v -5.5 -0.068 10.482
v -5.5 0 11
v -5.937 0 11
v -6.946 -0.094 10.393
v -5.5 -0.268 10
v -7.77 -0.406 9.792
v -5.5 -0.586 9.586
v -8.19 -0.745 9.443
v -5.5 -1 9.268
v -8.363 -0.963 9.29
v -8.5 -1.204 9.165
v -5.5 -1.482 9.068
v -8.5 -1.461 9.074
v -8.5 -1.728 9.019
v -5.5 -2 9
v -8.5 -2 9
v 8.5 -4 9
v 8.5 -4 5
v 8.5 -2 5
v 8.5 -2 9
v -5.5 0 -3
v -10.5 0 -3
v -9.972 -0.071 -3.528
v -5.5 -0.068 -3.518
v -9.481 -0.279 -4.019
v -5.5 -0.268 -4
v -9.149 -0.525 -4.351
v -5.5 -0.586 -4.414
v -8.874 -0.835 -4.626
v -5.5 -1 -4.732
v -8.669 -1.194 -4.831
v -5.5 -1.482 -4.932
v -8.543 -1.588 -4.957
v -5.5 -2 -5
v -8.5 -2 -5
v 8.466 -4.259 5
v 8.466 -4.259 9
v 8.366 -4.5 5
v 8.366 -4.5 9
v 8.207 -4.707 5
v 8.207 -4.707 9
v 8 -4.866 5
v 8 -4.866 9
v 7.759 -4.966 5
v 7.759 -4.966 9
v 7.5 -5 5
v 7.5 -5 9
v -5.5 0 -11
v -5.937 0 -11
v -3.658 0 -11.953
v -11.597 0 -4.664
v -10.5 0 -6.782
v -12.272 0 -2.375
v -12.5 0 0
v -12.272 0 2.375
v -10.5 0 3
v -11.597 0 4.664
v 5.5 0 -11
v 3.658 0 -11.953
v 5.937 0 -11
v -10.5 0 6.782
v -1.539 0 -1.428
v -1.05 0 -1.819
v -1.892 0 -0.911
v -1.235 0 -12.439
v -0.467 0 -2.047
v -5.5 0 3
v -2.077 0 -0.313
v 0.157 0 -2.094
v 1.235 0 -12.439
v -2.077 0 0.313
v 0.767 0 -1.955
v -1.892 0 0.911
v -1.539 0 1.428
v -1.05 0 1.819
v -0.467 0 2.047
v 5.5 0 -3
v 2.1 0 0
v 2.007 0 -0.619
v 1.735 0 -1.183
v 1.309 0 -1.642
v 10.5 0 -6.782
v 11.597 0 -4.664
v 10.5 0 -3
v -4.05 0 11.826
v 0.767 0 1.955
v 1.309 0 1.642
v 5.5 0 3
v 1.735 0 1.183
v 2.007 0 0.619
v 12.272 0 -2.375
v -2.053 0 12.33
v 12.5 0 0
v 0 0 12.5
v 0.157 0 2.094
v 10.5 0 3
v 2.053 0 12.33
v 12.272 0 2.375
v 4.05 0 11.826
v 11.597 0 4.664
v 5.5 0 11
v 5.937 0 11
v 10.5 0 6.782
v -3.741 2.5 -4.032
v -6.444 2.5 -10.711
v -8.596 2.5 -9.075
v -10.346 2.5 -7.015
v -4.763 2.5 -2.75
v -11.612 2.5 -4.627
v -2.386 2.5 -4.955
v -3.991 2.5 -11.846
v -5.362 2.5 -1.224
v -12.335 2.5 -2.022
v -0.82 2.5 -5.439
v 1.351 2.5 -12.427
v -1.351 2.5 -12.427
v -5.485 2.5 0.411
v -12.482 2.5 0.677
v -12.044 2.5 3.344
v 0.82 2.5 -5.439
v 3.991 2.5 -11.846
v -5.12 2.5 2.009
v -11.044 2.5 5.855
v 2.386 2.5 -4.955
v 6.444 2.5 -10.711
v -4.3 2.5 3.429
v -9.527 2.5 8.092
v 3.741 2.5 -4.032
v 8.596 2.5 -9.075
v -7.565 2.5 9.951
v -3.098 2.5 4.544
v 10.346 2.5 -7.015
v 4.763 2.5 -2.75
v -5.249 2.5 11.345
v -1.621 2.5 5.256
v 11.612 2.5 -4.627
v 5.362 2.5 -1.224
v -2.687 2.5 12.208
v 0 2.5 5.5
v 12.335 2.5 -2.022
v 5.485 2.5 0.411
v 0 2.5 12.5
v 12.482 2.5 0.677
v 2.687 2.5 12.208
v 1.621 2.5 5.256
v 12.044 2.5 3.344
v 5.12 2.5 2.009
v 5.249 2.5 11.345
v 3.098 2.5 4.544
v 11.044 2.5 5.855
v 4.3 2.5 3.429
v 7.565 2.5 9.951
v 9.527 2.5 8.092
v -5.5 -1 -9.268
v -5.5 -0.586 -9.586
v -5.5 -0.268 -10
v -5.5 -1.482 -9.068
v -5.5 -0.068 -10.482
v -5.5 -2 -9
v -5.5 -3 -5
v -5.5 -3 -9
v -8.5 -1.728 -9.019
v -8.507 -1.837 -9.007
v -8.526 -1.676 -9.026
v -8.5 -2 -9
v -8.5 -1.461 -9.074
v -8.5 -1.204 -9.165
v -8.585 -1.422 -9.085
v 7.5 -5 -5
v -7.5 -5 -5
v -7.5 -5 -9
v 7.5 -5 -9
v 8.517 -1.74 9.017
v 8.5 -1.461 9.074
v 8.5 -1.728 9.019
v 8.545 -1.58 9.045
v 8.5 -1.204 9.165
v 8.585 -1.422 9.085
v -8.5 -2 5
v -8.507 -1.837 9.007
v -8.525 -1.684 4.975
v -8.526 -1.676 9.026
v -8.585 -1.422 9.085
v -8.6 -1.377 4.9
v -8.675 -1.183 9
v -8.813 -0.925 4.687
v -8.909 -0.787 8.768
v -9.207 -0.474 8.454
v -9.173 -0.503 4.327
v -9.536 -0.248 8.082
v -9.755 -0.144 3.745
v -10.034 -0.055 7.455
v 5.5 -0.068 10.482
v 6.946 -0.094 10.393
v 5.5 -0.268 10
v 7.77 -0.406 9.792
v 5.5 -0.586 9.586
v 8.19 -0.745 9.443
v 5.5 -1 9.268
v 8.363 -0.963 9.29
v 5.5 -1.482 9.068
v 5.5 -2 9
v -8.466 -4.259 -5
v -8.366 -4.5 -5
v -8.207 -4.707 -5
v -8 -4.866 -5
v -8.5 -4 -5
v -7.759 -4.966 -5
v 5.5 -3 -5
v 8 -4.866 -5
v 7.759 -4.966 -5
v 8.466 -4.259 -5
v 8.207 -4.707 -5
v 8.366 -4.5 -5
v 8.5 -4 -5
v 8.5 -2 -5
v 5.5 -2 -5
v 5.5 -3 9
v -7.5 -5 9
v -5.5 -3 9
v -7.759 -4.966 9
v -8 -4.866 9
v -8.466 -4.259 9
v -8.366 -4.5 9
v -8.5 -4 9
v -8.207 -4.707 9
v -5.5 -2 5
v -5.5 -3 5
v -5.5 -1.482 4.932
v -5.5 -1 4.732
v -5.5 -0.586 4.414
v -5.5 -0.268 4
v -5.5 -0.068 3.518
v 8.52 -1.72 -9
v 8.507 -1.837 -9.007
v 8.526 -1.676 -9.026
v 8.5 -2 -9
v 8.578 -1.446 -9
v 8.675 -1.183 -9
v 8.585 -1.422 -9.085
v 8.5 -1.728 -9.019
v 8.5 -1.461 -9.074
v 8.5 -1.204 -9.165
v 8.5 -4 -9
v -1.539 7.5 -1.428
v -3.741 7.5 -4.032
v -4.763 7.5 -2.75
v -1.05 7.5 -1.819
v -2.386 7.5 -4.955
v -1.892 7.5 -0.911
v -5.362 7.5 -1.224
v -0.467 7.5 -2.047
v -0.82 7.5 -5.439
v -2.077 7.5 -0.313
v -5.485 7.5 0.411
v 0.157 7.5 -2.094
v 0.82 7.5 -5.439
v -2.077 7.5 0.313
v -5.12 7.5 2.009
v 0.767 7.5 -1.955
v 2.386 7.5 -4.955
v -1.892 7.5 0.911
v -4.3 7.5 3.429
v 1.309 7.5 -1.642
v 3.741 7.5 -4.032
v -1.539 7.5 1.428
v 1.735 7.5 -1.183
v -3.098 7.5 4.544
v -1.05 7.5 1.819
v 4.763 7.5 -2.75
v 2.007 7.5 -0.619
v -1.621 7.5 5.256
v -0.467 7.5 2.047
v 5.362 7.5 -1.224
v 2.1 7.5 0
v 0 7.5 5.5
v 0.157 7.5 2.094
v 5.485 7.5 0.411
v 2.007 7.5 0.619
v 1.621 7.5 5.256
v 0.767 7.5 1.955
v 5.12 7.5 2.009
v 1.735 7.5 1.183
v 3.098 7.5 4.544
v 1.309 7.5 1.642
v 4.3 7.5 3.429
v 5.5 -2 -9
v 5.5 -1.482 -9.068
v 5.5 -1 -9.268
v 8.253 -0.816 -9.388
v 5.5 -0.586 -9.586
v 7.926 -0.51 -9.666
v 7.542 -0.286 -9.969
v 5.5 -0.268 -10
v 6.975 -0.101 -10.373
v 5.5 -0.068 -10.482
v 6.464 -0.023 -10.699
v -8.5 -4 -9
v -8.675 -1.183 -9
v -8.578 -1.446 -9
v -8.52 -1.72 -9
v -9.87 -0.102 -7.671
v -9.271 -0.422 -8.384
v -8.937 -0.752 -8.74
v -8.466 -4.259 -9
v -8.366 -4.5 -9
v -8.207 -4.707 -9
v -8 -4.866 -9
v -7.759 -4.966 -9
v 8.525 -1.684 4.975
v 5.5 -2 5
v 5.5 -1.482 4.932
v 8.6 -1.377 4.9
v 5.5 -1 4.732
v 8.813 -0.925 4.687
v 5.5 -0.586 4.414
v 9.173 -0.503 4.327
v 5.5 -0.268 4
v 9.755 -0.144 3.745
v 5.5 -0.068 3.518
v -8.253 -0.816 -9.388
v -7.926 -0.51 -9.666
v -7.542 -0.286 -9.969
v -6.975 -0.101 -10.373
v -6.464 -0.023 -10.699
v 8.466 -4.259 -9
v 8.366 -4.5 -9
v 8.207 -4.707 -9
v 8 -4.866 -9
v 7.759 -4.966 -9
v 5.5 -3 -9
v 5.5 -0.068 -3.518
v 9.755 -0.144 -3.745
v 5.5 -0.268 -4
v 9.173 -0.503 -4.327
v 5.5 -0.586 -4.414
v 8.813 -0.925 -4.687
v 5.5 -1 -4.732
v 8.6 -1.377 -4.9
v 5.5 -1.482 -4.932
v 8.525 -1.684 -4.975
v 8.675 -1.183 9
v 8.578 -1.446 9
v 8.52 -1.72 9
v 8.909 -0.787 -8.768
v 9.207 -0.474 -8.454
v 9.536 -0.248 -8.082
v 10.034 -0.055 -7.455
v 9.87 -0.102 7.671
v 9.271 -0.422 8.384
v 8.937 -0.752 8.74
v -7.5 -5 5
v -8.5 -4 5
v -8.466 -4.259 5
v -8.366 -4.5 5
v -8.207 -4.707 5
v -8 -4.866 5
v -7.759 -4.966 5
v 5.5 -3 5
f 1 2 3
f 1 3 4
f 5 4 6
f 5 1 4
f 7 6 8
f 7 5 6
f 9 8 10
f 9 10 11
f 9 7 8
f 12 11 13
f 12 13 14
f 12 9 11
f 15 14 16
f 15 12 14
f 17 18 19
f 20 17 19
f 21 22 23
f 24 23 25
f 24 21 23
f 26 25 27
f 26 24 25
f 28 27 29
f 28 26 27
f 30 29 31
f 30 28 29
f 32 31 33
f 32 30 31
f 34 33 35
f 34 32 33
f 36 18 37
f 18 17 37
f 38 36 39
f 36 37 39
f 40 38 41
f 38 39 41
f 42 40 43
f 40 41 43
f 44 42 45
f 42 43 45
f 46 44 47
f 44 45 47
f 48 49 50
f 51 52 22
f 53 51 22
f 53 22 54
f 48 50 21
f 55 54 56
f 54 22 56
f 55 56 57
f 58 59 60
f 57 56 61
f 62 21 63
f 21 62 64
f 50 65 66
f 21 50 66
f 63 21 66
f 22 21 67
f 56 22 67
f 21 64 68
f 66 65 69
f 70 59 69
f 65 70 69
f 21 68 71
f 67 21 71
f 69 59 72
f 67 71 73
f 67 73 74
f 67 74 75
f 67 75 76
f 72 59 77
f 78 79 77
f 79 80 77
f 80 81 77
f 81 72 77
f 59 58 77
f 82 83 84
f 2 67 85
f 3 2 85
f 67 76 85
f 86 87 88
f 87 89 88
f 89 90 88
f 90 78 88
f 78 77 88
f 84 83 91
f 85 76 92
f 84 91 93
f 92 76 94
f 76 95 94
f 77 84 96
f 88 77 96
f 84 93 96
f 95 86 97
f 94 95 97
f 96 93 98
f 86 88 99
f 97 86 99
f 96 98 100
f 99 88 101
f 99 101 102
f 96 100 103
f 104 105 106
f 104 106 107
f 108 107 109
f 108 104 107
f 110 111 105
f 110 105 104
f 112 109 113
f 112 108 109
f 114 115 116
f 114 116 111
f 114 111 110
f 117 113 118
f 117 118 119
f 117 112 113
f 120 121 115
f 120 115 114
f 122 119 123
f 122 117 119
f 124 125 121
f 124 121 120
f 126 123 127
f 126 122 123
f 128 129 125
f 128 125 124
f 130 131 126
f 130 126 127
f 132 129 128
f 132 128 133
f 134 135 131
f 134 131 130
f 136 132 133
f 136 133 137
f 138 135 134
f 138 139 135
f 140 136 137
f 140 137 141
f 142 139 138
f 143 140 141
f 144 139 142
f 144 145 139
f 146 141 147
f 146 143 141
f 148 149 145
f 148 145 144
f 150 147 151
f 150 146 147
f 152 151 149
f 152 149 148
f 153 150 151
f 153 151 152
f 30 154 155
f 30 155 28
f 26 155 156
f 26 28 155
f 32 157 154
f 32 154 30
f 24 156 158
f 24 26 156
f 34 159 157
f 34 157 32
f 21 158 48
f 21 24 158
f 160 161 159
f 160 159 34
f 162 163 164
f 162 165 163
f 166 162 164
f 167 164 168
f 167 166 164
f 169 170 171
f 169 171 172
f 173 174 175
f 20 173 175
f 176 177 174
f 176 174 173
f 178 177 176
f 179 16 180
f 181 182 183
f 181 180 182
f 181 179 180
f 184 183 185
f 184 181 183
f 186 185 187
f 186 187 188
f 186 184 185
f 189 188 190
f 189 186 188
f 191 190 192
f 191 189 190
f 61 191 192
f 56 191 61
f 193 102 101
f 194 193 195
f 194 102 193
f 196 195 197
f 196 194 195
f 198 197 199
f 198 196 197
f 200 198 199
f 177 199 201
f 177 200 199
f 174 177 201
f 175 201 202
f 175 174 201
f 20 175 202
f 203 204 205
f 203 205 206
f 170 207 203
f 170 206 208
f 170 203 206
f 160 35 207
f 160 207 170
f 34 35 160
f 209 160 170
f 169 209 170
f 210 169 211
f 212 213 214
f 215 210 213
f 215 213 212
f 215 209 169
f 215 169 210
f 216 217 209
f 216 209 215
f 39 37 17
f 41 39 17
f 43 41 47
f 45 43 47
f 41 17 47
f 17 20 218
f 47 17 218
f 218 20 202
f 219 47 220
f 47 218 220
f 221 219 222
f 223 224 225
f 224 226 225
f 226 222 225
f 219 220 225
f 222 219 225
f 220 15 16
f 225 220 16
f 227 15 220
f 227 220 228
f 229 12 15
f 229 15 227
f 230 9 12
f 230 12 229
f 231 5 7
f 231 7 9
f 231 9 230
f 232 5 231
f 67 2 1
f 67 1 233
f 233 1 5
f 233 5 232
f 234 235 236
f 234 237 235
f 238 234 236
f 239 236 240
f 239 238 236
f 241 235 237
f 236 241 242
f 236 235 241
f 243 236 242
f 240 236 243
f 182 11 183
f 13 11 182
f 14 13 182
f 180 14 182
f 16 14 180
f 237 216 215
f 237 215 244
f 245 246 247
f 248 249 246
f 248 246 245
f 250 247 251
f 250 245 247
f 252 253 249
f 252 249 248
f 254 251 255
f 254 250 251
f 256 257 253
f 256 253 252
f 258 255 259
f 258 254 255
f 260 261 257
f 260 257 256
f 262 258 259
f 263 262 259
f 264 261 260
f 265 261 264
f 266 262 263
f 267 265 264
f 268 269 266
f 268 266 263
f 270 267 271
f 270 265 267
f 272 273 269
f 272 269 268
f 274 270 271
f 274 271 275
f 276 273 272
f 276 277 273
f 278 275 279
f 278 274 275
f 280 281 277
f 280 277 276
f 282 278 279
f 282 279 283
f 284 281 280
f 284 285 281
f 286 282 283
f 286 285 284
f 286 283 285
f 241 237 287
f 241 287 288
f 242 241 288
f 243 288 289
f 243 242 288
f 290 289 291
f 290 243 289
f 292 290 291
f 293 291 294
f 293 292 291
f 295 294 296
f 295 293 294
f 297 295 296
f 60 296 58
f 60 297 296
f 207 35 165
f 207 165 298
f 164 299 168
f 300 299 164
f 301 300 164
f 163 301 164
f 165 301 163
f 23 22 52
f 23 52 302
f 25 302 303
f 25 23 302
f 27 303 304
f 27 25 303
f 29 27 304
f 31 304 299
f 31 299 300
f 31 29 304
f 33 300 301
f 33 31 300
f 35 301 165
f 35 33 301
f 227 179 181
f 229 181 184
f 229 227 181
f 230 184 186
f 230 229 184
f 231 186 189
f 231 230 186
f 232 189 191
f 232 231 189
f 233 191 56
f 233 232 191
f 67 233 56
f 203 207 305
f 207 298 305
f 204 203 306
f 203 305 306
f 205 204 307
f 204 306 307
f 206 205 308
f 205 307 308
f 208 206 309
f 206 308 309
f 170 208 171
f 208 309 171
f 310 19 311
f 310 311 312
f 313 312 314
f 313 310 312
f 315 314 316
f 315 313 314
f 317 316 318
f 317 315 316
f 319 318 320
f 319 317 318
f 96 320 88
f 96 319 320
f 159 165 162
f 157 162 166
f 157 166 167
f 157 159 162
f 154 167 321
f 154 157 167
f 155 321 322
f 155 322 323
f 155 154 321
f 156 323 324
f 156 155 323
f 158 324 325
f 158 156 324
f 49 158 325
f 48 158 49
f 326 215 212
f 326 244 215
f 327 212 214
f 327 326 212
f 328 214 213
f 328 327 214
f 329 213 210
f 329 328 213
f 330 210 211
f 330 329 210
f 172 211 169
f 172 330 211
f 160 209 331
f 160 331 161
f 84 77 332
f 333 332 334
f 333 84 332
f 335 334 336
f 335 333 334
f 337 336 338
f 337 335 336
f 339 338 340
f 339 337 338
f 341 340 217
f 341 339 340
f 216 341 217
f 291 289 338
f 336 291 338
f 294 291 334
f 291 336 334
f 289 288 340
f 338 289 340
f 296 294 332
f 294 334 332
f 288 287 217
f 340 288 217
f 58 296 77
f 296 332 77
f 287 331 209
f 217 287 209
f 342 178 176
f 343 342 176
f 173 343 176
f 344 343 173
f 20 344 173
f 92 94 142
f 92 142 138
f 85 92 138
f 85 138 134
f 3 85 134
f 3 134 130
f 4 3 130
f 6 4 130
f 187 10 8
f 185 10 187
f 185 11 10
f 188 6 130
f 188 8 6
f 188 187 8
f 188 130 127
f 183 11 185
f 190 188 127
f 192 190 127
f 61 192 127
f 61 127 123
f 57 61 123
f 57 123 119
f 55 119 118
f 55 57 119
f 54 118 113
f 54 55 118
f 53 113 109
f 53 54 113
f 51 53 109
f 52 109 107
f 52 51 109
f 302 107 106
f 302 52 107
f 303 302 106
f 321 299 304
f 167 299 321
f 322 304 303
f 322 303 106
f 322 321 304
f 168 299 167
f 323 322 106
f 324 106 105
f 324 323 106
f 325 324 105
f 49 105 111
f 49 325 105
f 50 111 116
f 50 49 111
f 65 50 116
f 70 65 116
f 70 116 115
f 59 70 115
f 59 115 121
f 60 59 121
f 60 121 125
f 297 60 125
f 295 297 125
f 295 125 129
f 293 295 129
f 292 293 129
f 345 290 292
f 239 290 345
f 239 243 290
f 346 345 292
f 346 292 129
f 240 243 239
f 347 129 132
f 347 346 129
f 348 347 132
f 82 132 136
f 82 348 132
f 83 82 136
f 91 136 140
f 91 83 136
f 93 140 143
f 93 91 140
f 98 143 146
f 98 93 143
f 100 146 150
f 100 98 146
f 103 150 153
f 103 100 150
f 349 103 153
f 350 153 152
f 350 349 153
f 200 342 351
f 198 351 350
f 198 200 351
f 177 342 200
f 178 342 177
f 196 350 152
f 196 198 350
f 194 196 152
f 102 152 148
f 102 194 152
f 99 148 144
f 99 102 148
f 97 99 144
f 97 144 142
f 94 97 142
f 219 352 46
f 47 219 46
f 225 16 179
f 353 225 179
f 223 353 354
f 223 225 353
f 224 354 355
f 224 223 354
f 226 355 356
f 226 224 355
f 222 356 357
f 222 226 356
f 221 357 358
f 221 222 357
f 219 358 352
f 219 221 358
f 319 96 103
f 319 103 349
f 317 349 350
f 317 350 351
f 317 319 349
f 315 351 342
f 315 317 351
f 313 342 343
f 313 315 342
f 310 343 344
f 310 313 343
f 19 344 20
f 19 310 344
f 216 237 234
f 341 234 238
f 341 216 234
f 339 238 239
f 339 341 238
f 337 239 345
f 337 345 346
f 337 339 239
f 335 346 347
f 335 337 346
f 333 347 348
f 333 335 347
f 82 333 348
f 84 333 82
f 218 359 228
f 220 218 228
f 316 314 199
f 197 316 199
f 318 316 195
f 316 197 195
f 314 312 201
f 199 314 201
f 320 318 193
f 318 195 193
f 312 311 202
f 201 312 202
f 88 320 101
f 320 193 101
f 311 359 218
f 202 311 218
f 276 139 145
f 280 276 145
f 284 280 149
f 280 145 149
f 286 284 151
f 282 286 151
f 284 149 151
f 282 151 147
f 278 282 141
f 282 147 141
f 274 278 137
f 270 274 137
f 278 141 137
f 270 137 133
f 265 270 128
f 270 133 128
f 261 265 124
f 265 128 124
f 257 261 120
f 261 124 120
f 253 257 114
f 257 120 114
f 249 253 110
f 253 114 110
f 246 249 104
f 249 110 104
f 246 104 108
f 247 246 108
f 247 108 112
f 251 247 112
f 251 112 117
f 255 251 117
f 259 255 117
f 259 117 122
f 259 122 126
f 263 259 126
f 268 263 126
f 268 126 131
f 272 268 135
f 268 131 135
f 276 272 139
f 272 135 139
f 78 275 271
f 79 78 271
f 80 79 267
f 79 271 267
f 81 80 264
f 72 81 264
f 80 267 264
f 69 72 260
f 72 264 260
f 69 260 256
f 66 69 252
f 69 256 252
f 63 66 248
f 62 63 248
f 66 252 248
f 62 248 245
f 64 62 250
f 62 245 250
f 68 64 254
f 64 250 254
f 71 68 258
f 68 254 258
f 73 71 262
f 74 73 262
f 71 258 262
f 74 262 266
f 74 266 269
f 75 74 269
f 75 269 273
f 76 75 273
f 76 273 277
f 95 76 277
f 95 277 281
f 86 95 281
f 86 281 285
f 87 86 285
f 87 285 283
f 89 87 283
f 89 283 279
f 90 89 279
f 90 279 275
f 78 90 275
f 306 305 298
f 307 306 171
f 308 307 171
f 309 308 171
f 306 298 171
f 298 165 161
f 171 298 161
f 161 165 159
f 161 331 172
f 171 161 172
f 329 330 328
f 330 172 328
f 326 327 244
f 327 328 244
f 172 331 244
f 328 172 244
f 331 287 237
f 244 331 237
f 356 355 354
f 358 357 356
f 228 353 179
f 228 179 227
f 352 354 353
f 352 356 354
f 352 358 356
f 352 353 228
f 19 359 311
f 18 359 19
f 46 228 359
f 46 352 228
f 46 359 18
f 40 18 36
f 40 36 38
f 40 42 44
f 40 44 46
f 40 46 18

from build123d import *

# Parameters (mm, degrees)
SKETCH1_R                 = 12.5
BOSS_EXTRUDE1_DEPTH       = 2.5
SKETCH2_R                 = 5.5
BOSS_EXTRUDE2_DEPTH       = 5
F_3_0MM_DOWEL_HOLE1_D     = 4.2
F_3_0MM_DOWEL_HOLE1_DEPTH = 10
F_3_0MM_DOWEL_HOLE1_TIP   = 1.2618073
BOSS_EXTRUDE3_START       = -3
BOSS_EXTRUDE3_DEPTH       = 4
FILLET1_R                 = 2
FILLET2_R                 = 1


with BuildPart() as part:
    # Sketch1 → Boss-Extrude1 (new body)
    with BuildSketch(Plane(origin=(0, 0, 0), x_dir=(1, 0, 0), z_dir=(0, 1, 0))):
        with Locations(Location((0, 0, 0), (0, 0, 270))):
            Circle(SKETCH1_R)
    extrude(amount=BOSS_EXTRUDE1_DEPTH)

    # Sketch2 → Boss-Extrude2 (add)
    with BuildSketch(Plane(origin=(0, 2.5, 0), x_dir=(1, 0, 0), z_dir=(0, 1, 0))):
        with Locations(Location((0, 0, 0), (0, 0, 270))):
            Circle(SKETCH2_R)
    extrude(amount=BOSS_EXTRUDE2_DEPTH)

    # Ø3.0mm Dowel Hole1
    with Locations(Plane(origin=(0, 0, 0), x_dir=(-1, 0, 0), z_dir=(0, -1, 0))):
        with Locations((0, 0)):
            Hole(F_3_0MM_DOWEL_HOLE1_D / 2, depth=F_3_0MM_DOWEL_HOLE1_DEPTH)
            with Locations((0, 0, -(F_3_0MM_DOWEL_HOLE1_DEPTH + F_3_0MM_DOWEL_HOLE1_TIP / 2))):  # 118° drill point
                Cone(0, F_3_0MM_DOWEL_HOLE1_D / 2, F_3_0MM_DOWEL_HOLE1_TIP, mode=Mode.SUBTRACT)

    # Sketch6 → Boss-Extrude3 (add)
    with BuildSketch(Plane.XY.offset(8).offset(BOSS_EXTRUDE3_START)):
        Polygon((-5.5, 0), (-8.5, 0), (-8.5, -5), (8.5, -5), (8.5, 0), (5.5, 0), (5.5, -3), (-5.5, -3), align=None)
    boss_extrude3 = extrude(amount=BOSS_EXTRUDE3_DEPTH)

    # Mirror1: Boss-Extrude3 across plane
    add(boss_extrude3.mirror(Plane.XY))

    # Fillet1
    # the kernel refuses this fillet: 2 mm, written as the material it adds along each edge
    with BuildSketch(Plane(origin=(8.5, 0, 5), x_dir=(1, 0, 0), z_dir=(0, 0, 1))) as fillet1_piece_1_section:
        with BuildLine():
            CenterArc((FILLET1_R, -FILLET1_R), FILLET1_R, 90, 90)
            Line((0, -FILLET1_R), (0, 0))
            Line((0, 0), (FILLET1_R, 0))
        make_face()
    fillet1_piece_1 = extrude(amount=4, mode=Mode.PRIVATE)
    fillet1_piece_1 = fillet1_piece_1 & Plane(origin=(0, -0.480708784, 0), x_dir=(0, 0, 1), z_dir=(0, -1, 0)) * Cylinder(12.5, 16, mode=Mode.PRIVATE)
    add(fillet1_piece_1)
    with BuildSketch(Plane(origin=(8.5, 0, 9), x_dir=(0, 0, 1), z_dir=(-1, 0, 0))) as fillet1_piece_2_section:
        with BuildLine():
            CenterArc((FILLET1_R, -FILLET1_R), FILLET1_R, 90, 90)
            Line((0, -FILLET1_R), (0, 0))
            Line((0, 0), (FILLET1_R, 0))
        make_face()
    fillet1_piece_2 = extrude(amount=3, mode=Mode.PRIVATE)
    fillet1_piece_2 = fillet1_piece_2 & Plane(origin=(0, -0.497609904, 0), x_dir=(0, 0, 1), z_dir=(0, -1, 0)) * Cylinder(12.5, 14, mode=Mode.PRIVATE)
    add(fillet1_piece_2)
    with BuildSketch(Plane(origin=(-5.5, 0, 9), x_dir=(0, 0, 1), z_dir=(-1, 0, 0))) as fillet1_piece_3_section:
        with BuildLine():
            CenterArc((FILLET1_R, -FILLET1_R), FILLET1_R, 90, 90)
            Line((0, -FILLET1_R), (0, 0))
            Line((0, 0), (FILLET1_R, 0))
        make_face()
    fillet1_piece_3 = extrude(amount=3, mode=Mode.PRIVATE)
    fillet1_piece_3 = fillet1_piece_3 & Plane(origin=(0, -0.497609936, 0), x_dir=(0, 0, 1), z_dir=(0, -1, 0)) * Cylinder(12.5, 14, mode=Mode.PRIVATE)
    add(fillet1_piece_3)
    with BuildSketch(Plane(origin=(-8.5, 0, 5), x_dir=(-1, 0, 0), z_dir=(0, 0, 1))) as fillet1_piece_4_section:
        with BuildLine():
            CenterArc((FILLET1_R, FILLET1_R), FILLET1_R, 180, 90)
            Line((0, FILLET1_R), (0, 0))
            Line((0, 0), (FILLET1_R, 0))
        make_face()
    fillet1_piece_4 = extrude(amount=4, mode=Mode.PRIVATE)
    fillet1_piece_4 = fillet1_piece_4 & Plane(origin=(0, -0.48070882, 0), x_dir=(0, 0, 1), z_dir=(0, -1, 0)) * Cylinder(12.5, 16, mode=Mode.PRIVATE)
    add(fillet1_piece_4)
    with BuildSketch(Plane(origin=(8.5, 0, 5), x_dir=(0, 0, -1), z_dir=(-1, 0, 0)), Plane(origin=(-5.5, 0, 5), x_dir=(0, 0, -1), z_dir=(-1, 0, 0))) as fillet1_piece_5:
        with BuildLine():
            CenterArc((FILLET1_R, FILLET1_R), FILLET1_R, 180, 90)
            Line((0, FILLET1_R), (0, 0))
            Line((0, 0), (FILLET1_R, 0))
        make_face()
    extrude(amount=3)
    with BuildSketch(Plane(origin=(8.5, 0, -5), x_dir=(0, 0, 1), z_dir=(-1, 0, 0)), Plane(origin=(-5.5, 0, -5), x_dir=(0, 0, 1), z_dir=(-1, 0, 0))) as fillet1_piece_6:
        with BuildLine():
            CenterArc((FILLET1_R, -FILLET1_R), FILLET1_R, 90, 90)
            Line((0, -FILLET1_R), (0, 0))
            Line((0, 0), (FILLET1_R, 0))
        make_face()
    extrude(amount=3)
    with BuildSketch(Plane(origin=(8.5, 0, -5), x_dir=(1, 0, 0), z_dir=(0, 0, -1))) as fillet1_piece_7_section:
        with BuildLine():
            CenterArc((FILLET1_R, FILLET1_R), FILLET1_R, 180, 90)
            Line((0, FILLET1_R), (0, 0))
            Line((0, 0), (FILLET1_R, 0))
        make_face()
    fillet1_piece_7 = extrude(amount=4, mode=Mode.PRIVATE)
    fillet1_piece_7 = fillet1_piece_7 & Plane(origin=(0, -0.48070882, 0), x_dir=(0, 0, 1), z_dir=(0, -1, 0)) * Cylinder(12.5, 16, mode=Mode.PRIVATE)
    add(fillet1_piece_7)
    with BuildSketch(Plane(origin=(-8.5, 0, -5), x_dir=(-1, 0, 0), z_dir=(0, 0, -1))) as fillet1_piece_8_section:
        with BuildLine():
            CenterArc((FILLET1_R, -FILLET1_R), FILLET1_R, 90, 90)
            Line((0, -FILLET1_R), (0, 0))
            Line((0, 0), (FILLET1_R, 0))
        make_face()
    fillet1_piece_8 = extrude(amount=4, mode=Mode.PRIVATE)
    fillet1_piece_8 = fillet1_piece_8 & Plane(origin=(0, -0.480708785, 0), x_dir=(0, 0, 1), z_dir=(0, -1, 0)) * Cylinder(12.5, 16, mode=Mode.PRIVATE)
    add(fillet1_piece_8)
    with BuildSketch(Plane(origin=(8.5, 0, -9), x_dir=(0, 0, -1), z_dir=(-1, 0, 0))) as fillet1_piece_9_section:
        with BuildLine():
            CenterArc((FILLET1_R, FILLET1_R), FILLET1_R, 180, 90)
            Line((0, FILLET1_R), (0, 0))
            Line((0, 0), (FILLET1_R, 0))
        make_face()
    fillet1_piece_9 = extrude(amount=3, mode=Mode.PRIVATE)
    fillet1_piece_9 = fillet1_piece_9 & Plane(origin=(0, -0.497609946, 0), x_dir=(0, 0, 1), z_dir=(0, -1, 0)) * Cylinder(12.5, 14, mode=Mode.PRIVATE)
    add(fillet1_piece_9)
    with BuildSketch(Plane(origin=(-5.5, 0, -9), x_dir=(0, 0, -1), z_dir=(-1, 0, 0))) as fillet1_piece_10_section:
        with BuildLine():
            CenterArc((FILLET1_R, FILLET1_R), FILLET1_R, 180, 90)
            Line((0, FILLET1_R), (0, 0))
            Line((0, 0), (FILLET1_R, 0))
        make_face()
    fillet1_piece_10 = extrude(amount=3, mode=Mode.PRIVATE)
    fillet1_piece_10 = fillet1_piece_10 & Plane(origin=(0, -0.497609939, 0), x_dir=(0, 0, 1), z_dir=(0, -1, 0)) * Cylinder(12.5, 14, mode=Mode.PRIVATE)
    add(fillet1_piece_10)
    with BuildSketch(Plane(origin=(13.5, 0, 5), x_dir=(0, 0, -1), z_dir=(-1, 0, 0))) as fillet1_piece_11a_section:
        with BuildLine():
            CenterArc((FILLET1_R, FILLET1_R), FILLET1_R, 180, 90)
            Line((0, FILLET1_R), (0, 0))
            Line((0, 0), (FILLET1_R, 0))
        make_face()
    fillet1_piece_11a = extrude(amount=8, mode=Mode.PRIVATE)
    fillet1_piece_11a = fillet1_piece_11a & Plane(origin=(0, -0.439550535, 0), x_dir=(0, 0, 1), z_dir=(0, -1, 0)) * Cylinder(12.5, 24, mode=Mode.PRIVATE)
    fillet1_piece_11a = split(fillet1_piece_11a, bisect_by=Plane(origin=(8.5, -0.439550535, 4.525411001), z_dir=(1, 0, 0)), keep=Keep.TOP, mode=Mode.PRIVATE)
    with BuildSketch(Plane(origin=(8.5, 0, 0), x_dir=(1, 0, 0), z_dir=(0, 0, 1))) as fillet1_piece_11b_section:
        with BuildLine():
            CenterArc((FILLET1_R, -FILLET1_R), FILLET1_R, 90, 90)
            Line((0, -FILLET1_R), (0, 0))
            Line((0, 0), (FILLET1_R, 0))
        make_face()
    fillet1_piece_11b = extrude(amount=9, mode=Mode.PRIVATE)
    fillet1_piece_11b = split(fillet1_piece_11b, bisect_by=Plane(origin=(8.952790229, -0.452790229, 5), z_dir=(0, 0, -1)), keep=Keep.TOP, mode=Mode.PRIVATE)
    fillet1_piece_11 = fillet1_piece_11a & fillet1_piece_11b
    add(fillet1_piece_11)
    with BuildSketch(Plane(origin=(8.5, 0, 5), x_dir=(1, 0, 0), z_dir=(0, 0, 1))) as fillet1_piece_12a_section:
        with BuildLine():
            CenterArc((FILLET1_R, -FILLET1_R), FILLET1_R, 90, 90)
            Line((0, -FILLET1_R), (0, 0))
            Line((0, 0), (FILLET1_R, 0))
        make_face()
    fillet1_piece_12a = extrude(amount=9, mode=Mode.PRIVATE)
    fillet1_piece_12a = fillet1_piece_12a & Plane(origin=(0, -0.851863441, 0), x_dir=(0, 0, 1), z_dir=(0, -1, 0)) * Cylinder(12.5, 26, mode=Mode.PRIVATE)
    fillet1_piece_12a = split(fillet1_piece_12a, bisect_by=Plane(origin=(8.524607879, -0.851863441, 9), z_dir=(0, 0, 1)), keep=Keep.TOP, mode=Mode.PRIVATE)
    with BuildSketch(Plane(origin=(13.5, 0, 9), x_dir=(0, 0, 1), z_dir=(-1, 0, 0))) as fillet1_piece_12b_section:
        with BuildLine():
            CenterArc((FILLET1_R, -FILLET1_R), FILLET1_R, 90, 90)
            Line((0, -FILLET1_R), (0, 0))
            Line((0, 0), (FILLET1_R, 0))
        make_face()
    fillet1_piece_12b = extrude(amount=8, mode=Mode.PRIVATE)
    fillet1_piece_12b = fillet1_piece_12b & Plane(origin=(0, -0.857818141, 0), x_dir=(0, 0, 1), z_dir=(0, -1, 0)) * Cylinder(12.5, 24, mode=Mode.PRIVATE)
    fillet1_piece_12b = split(fillet1_piece_12b, bisect_by=Plane(origin=(8.5, -0.857818141, 9.021962646), z_dir=(1, 0, 0)), keep=Keep.TOP, mode=Mode.PRIVATE)
    fillet1_piece_12 = fillet1_piece_12a & fillet1_piece_12b
    add(fillet1_piece_12)
    with BuildSketch(Plane(origin=(-8.5, 0, 5), x_dir=(-1, 0, 0), z_dir=(0, 0, 1))) as fillet1_piece_13a_section:
        with BuildLine():
            CenterArc((FILLET1_R, FILLET1_R), FILLET1_R, 180, 90)
            Line((0, FILLET1_R), (0, 0))
            Line((0, 0), (FILLET1_R, 0))
        make_face()
    fillet1_piece_13a = extrude(amount=9, mode=Mode.PRIVATE)
    fillet1_piece_13a = fillet1_piece_13a & Plane(origin=(0, -0.851863441, 0), x_dir=(0, 0, 1), z_dir=(0, -1, 0)) * Cylinder(12.5, 26, mode=Mode.PRIVATE)
    fillet1_piece_13a = split(fillet1_piece_13a, bisect_by=Plane(origin=(-8.524607879, -0.851863441, 9), z_dir=(0, 0, 1)), keep=Keep.TOP, mode=Mode.PRIVATE)
    with BuildSketch(Plane(origin=(-5.5, 0, 9), x_dir=(0, 0, 1), z_dir=(-1, 0, 0))) as fillet1_piece_13b_section:
        with BuildLine():
            CenterArc((FILLET1_R, -FILLET1_R), FILLET1_R, 90, 90)
            Line((0, -FILLET1_R), (0, 0))
            Line((0, 0), (FILLET1_R, 0))
        make_face()
    fillet1_piece_13b = extrude(amount=8, mode=Mode.PRIVATE)
    fillet1_piece_13b = fillet1_piece_13b & Plane(origin=(0, -0.857818141, 0), x_dir=(0, 0, 1), z_dir=(0, -1, 0)) * Cylinder(12.5, 24, mode=Mode.PRIVATE)
    fillet1_piece_13b = split(fillet1_piece_13b, bisect_by=Plane(origin=(-8.5, -0.857818141, 9.021962647), z_dir=(-1, 0, 0)), keep=Keep.TOP, mode=Mode.PRIVATE)
    fillet1_piece_13 = fillet1_piece_13a & fillet1_piece_13b
    add(fillet1_piece_13)
    with BuildSketch(Plane(origin=(-5.5, 0, 5), x_dir=(0, 0, -1), z_dir=(-1, 0, 0))) as fillet1_piece_14a_section:
        with BuildLine():
            CenterArc((FILLET1_R, FILLET1_R), FILLET1_R, 180, 90)
            Line((0, FILLET1_R), (0, 0))
            Line((0, 0), (FILLET1_R, 0))
        make_face()
    fillet1_piece_14a = extrude(amount=8, mode=Mode.PRIVATE)
    fillet1_piece_14a = fillet1_piece_14a & Plane(origin=(0, -0.439548718, 0), x_dir=(0, 0, 1), z_dir=(0, -1, 0)) * Cylinder(12.5, 24, mode=Mode.PRIVATE)
    fillet1_piece_14a = split(fillet1_piece_14a, bisect_by=Plane(origin=(-8.5, -0.439548718, 4.525414754), z_dir=(-1, 0, 0)), keep=Keep.TOP, mode=Mode.PRIVATE)
    with BuildSketch(Plane(origin=(-8.5, 0, 0), x_dir=(-1, 0, 0), z_dir=(0, 0, 1))) as fillet1_piece_14b_section:
        with BuildLine():
            CenterArc((FILLET1_R, FILLET1_R), FILLET1_R, 180, 90)
            Line((0, FILLET1_R), (0, 0))
            Line((0, 0), (FILLET1_R, 0))
        make_face()
    fillet1_piece_14b = extrude(amount=9, mode=Mode.PRIVATE)
    fillet1_piece_14b = split(fillet1_piece_14b, bisect_by=Plane(origin=(-8.952790229, -0.452790229, 5), z_dir=(0, 0, -1)), keep=Keep.TOP, mode=Mode.PRIVATE)
    fillet1_piece_14 = fillet1_piece_14a & fillet1_piece_14b
    add(fillet1_piece_14)
    with BuildSketch(Plane(origin=(8.5, 0, 0), x_dir=(1, 0, 0), z_dir=(0, 0, -1))) as fillet1_piece_15a_section:
        with BuildLine():
            CenterArc((FILLET1_R, FILLET1_R), FILLET1_R, 180, 90)
            Line((0, FILLET1_R), (0, 0))
            Line((0, 0), (FILLET1_R, 0))
        make_face()
    fillet1_piece_15a = extrude(amount=9, mode=Mode.PRIVATE)
    fillet1_piece_15a = split(fillet1_piece_15a, bisect_by=Plane(origin=(8.952790229, -0.452790229, -5), z_dir=(0, 0, 1)), keep=Keep.TOP, mode=Mode.PRIVATE)
    with BuildSketch(Plane(origin=(13.5, 0, -5), x_dir=(0, 0, 1), z_dir=(-1, 0, 0))) as fillet1_piece_15b_section:
        with BuildLine():
            CenterArc((FILLET1_R, -FILLET1_R), FILLET1_R, 90, 90)
            Line((0, -FILLET1_R), (0, 0))
            Line((0, 0), (FILLET1_R, 0))
        make_face()
    fillet1_piece_15b = extrude(amount=8, mode=Mode.PRIVATE)
    fillet1_piece_15b = fillet1_piece_15b & Plane(origin=(0, -0.439548718, 0), x_dir=(0, 0, 1), z_dir=(0, -1, 0)) * Cylinder(12.5, 24, mode=Mode.PRIVATE)
    fillet1_piece_15b = split(fillet1_piece_15b, bisect_by=Plane(origin=(8.5, -0.439548718, -4.525414754), z_dir=(1, 0, 0)), keep=Keep.TOP, mode=Mode.PRIVATE)
    fillet1_piece_15 = fillet1_piece_15a & fillet1_piece_15b
    add(fillet1_piece_15)
    with BuildSketch(Plane(origin=(8.5, 0, -5), x_dir=(1, 0, 0), z_dir=(0, 0, -1))) as fillet1_piece_16a_section:
        with BuildLine():
            CenterArc((FILLET1_R, FILLET1_R), FILLET1_R, 180, 90)
            Line((0, FILLET1_R), (0, 0))
            Line((0, 0), (FILLET1_R, 0))
        make_face()
    fillet1_piece_16a = extrude(amount=9, mode=Mode.PRIVATE)
    fillet1_piece_16a = fillet1_piece_16a & Plane(origin=(0, -0.85186344, 0), x_dir=(0, 0, 1), z_dir=(0, -1, 0)) * Cylinder(12.5, 26, mode=Mode.PRIVATE)
    fillet1_piece_16a = split(fillet1_piece_16a, bisect_by=Plane(origin=(8.524607879, -0.85186344, -9), z_dir=(0, 0, -1)), keep=Keep.TOP, mode=Mode.PRIVATE)
    with BuildSketch(Plane(origin=(13.5, 0, -9), x_dir=(0, 0, -1), z_dir=(-1, 0, 0))) as fillet1_piece_16b_section:
        with BuildLine():
            CenterArc((FILLET1_R, FILLET1_R), FILLET1_R, 180, 90)
            Line((0, FILLET1_R), (0, 0))
            Line((0, 0), (FILLET1_R, 0))
        make_face()
    fillet1_piece_16b = extrude(amount=8, mode=Mode.PRIVATE)
    fillet1_piece_16b = fillet1_piece_16b & Plane(origin=(0, -0.85781814, 0), x_dir=(0, 0, 1), z_dir=(0, -1, 0)) * Cylinder(12.5, 24, mode=Mode.PRIVATE)
    fillet1_piece_16b = split(fillet1_piece_16b, bisect_by=Plane(origin=(8.5, -0.85781814, -9.021962646), z_dir=(1, 0, 0)), keep=Keep.TOP, mode=Mode.PRIVATE)
    fillet1_piece_16 = fillet1_piece_16a & fillet1_piece_16b
    add(fillet1_piece_16)
    with BuildSketch(Plane(origin=(-8.5, 0, 0), x_dir=(-1, 0, 0), z_dir=(0, 0, -1))) as fillet1_piece_17a_section:
        with BuildLine():
            CenterArc((FILLET1_R, -FILLET1_R), FILLET1_R, 90, 90)
            Line((0, -FILLET1_R), (0, 0))
            Line((0, 0), (FILLET1_R, 0))
        make_face()
    fillet1_piece_17a = extrude(amount=9, mode=Mode.PRIVATE)
    fillet1_piece_17a = split(fillet1_piece_17a, bisect_by=Plane(origin=(-8.952790229, -0.452790229, -5), z_dir=(0, 0, 1)), keep=Keep.TOP, mode=Mode.PRIVATE)
    with BuildSketch(Plane(origin=(-5.5, 0, -5), x_dir=(0, 0, 1), z_dir=(-1, 0, 0))) as fillet1_piece_17b_section:
        with BuildLine():
            CenterArc((FILLET1_R, -FILLET1_R), FILLET1_R, 90, 90)
            Line((0, -FILLET1_R), (0, 0))
            Line((0, 0), (FILLET1_R, 0))
        make_face()
    fillet1_piece_17b = extrude(amount=8, mode=Mode.PRIVATE)
    fillet1_piece_17b = fillet1_piece_17b & Plane(origin=(0, -0.439550535, 0), x_dir=(0, 0, 1), z_dir=(0, -1, 0)) * Cylinder(12.5, 24, mode=Mode.PRIVATE)
    fillet1_piece_17b = split(fillet1_piece_17b, bisect_by=Plane(origin=(-8.5, -0.439550535, -4.525411001), z_dir=(-1, 0, 0)), keep=Keep.TOP, mode=Mode.PRIVATE)
    fillet1_piece_17 = fillet1_piece_17a & fillet1_piece_17b
    add(fillet1_piece_17)
    with BuildSketch(Plane(origin=(-5.5, 0, -9), x_dir=(0, 0, -1), z_dir=(-1, 0, 0))) as fillet1_piece_18a_section:
        with BuildLine():
            CenterArc((FILLET1_R, FILLET1_R), FILLET1_R, 180, 90)
            Line((0, FILLET1_R), (0, 0))
            Line((0, 0), (FILLET1_R, 0))
        make_face()
    fillet1_piece_18a = extrude(amount=8, mode=Mode.PRIVATE)
    fillet1_piece_18a = fillet1_piece_18a & Plane(origin=(0, -0.857818141, 0), x_dir=(0, 0, 1), z_dir=(0, -1, 0)) * Cylinder(12.5, 24, mode=Mode.PRIVATE)
    fillet1_piece_18a = split(fillet1_piece_18a, bisect_by=Plane(origin=(-8.5, -0.857818141, -9.021962647), z_dir=(-1, 0, 0)), keep=Keep.TOP, mode=Mode.PRIVATE)
    with BuildSketch(Plane(origin=(-8.5, 0, -5), x_dir=(-1, 0, 0), z_dir=(0, 0, -1))) as fillet1_piece_18b_section:
        with BuildLine():
            CenterArc((FILLET1_R, -FILLET1_R), FILLET1_R, 90, 90)
            Line((0, -FILLET1_R), (0, 0))
            Line((0, 0), (FILLET1_R, 0))
        make_face()
    fillet1_piece_18b = extrude(amount=9, mode=Mode.PRIVATE)
    fillet1_piece_18b = fillet1_piece_18b & Plane(origin=(0, -0.851863441, 0), x_dir=(0, 0, 1), z_dir=(0, -1, 0)) * Cylinder(12.5, 26, mode=Mode.PRIVATE)
    fillet1_piece_18b = split(fillet1_piece_18b, bisect_by=Plane(origin=(-8.524607879, -0.851863441, -9), z_dir=(0, 0, -1)), keep=Keep.TOP, mode=Mode.PRIVATE)
    fillet1_piece_18 = fillet1_piece_18a & fillet1_piece_18b
    add(fillet1_piece_18)

    # Fillet2
    fillet2_edges = [part.edges().sort_by_distance(p)[0] for p in [
        (-8.5, -5, 7),
        (8.5, -5, 7),
        (8.5, -5, -7),
        (-8.5, -5, -7),
    ]]
    fillet(fillet2_edges, radius=FILLET2_R)


solid = part.part
